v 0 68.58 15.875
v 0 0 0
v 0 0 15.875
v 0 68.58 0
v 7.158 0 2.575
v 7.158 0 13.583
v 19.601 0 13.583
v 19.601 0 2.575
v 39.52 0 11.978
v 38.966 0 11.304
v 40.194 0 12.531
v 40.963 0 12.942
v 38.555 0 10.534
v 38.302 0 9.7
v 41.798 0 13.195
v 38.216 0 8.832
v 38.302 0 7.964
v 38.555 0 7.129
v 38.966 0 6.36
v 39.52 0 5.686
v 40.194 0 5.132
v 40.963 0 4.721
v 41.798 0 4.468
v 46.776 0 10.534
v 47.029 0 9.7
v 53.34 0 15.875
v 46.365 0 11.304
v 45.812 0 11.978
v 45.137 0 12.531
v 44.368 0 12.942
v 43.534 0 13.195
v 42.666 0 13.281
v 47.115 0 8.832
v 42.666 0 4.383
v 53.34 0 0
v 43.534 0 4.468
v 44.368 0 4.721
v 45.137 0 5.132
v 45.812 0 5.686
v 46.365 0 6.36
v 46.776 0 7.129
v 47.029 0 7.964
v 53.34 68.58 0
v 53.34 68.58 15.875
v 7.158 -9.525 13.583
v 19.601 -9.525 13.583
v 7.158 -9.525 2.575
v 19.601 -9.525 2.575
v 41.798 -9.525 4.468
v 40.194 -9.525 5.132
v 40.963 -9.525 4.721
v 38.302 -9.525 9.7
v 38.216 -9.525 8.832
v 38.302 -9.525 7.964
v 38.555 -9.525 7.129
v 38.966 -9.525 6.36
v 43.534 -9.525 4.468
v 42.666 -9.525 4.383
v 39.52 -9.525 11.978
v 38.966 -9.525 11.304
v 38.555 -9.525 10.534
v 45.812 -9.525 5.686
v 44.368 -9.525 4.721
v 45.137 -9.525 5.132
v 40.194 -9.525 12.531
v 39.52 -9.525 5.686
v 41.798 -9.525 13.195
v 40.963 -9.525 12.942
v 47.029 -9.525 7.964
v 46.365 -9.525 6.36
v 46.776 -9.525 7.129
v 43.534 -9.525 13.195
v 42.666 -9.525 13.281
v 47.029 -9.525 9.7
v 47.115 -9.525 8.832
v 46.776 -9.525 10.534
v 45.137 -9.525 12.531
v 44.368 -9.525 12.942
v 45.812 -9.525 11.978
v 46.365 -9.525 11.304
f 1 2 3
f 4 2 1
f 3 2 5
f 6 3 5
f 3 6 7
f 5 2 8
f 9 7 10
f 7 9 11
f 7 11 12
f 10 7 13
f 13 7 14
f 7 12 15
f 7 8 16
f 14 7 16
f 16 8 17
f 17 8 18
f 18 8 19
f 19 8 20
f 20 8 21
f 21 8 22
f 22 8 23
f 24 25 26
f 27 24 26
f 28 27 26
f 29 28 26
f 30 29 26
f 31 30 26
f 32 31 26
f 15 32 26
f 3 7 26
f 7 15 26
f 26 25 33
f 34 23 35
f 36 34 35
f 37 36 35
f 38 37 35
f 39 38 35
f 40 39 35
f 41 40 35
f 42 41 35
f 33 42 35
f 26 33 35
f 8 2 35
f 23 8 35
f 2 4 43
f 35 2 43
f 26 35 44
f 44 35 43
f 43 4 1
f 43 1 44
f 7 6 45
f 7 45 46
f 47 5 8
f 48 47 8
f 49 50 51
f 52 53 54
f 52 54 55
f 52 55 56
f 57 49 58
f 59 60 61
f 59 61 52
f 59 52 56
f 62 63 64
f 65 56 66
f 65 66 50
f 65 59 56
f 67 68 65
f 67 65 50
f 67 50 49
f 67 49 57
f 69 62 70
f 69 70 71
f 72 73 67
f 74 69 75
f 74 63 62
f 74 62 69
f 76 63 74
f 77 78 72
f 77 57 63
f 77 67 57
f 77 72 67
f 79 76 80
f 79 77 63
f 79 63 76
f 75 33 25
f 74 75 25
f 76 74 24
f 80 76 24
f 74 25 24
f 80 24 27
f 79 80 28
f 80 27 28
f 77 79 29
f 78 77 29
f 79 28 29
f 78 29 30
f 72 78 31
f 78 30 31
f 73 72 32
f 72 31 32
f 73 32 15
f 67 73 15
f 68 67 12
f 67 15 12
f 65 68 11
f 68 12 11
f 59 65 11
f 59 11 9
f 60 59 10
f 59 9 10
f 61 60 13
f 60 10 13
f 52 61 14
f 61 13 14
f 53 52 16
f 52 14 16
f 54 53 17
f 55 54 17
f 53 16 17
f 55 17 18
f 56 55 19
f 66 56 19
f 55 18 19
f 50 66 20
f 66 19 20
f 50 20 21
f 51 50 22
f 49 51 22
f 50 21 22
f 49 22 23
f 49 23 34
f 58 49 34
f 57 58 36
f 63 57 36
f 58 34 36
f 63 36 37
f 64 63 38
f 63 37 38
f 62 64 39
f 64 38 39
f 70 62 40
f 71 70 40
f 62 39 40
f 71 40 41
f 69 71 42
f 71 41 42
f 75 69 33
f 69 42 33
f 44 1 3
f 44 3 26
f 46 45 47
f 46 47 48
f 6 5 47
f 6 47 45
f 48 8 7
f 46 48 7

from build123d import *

# Parameters (mm, degrees)
F0_W     = 53.34
F0_H     = 68.58
F1_DEPTH = 15.875
F2_W     = 12.443692
F2_H     = 11.007975
F2_R     = 4.449161
F3_DEPTH = 9.525


with BuildPart() as f1:
    # F0 (on Top) → F1 (new body)
    with BuildSketch(Plane.XY):
        with Locations((26.67, 34.29)):
            Rectangle(F0_W, F0_H)
    extrude(amount=F1_DEPTH)

    # F2 (on face) → F3 (join)
    with BuildSketch(Plane.XZ):
        with Locations((13.379577, 8.078674)):
            Rectangle(F2_W, F2_H)
        with Locations((42.665571, 8.831811)):
            Circle(F2_R)
    extrude(amount=F3_DEPTH)


solid = f1.part
